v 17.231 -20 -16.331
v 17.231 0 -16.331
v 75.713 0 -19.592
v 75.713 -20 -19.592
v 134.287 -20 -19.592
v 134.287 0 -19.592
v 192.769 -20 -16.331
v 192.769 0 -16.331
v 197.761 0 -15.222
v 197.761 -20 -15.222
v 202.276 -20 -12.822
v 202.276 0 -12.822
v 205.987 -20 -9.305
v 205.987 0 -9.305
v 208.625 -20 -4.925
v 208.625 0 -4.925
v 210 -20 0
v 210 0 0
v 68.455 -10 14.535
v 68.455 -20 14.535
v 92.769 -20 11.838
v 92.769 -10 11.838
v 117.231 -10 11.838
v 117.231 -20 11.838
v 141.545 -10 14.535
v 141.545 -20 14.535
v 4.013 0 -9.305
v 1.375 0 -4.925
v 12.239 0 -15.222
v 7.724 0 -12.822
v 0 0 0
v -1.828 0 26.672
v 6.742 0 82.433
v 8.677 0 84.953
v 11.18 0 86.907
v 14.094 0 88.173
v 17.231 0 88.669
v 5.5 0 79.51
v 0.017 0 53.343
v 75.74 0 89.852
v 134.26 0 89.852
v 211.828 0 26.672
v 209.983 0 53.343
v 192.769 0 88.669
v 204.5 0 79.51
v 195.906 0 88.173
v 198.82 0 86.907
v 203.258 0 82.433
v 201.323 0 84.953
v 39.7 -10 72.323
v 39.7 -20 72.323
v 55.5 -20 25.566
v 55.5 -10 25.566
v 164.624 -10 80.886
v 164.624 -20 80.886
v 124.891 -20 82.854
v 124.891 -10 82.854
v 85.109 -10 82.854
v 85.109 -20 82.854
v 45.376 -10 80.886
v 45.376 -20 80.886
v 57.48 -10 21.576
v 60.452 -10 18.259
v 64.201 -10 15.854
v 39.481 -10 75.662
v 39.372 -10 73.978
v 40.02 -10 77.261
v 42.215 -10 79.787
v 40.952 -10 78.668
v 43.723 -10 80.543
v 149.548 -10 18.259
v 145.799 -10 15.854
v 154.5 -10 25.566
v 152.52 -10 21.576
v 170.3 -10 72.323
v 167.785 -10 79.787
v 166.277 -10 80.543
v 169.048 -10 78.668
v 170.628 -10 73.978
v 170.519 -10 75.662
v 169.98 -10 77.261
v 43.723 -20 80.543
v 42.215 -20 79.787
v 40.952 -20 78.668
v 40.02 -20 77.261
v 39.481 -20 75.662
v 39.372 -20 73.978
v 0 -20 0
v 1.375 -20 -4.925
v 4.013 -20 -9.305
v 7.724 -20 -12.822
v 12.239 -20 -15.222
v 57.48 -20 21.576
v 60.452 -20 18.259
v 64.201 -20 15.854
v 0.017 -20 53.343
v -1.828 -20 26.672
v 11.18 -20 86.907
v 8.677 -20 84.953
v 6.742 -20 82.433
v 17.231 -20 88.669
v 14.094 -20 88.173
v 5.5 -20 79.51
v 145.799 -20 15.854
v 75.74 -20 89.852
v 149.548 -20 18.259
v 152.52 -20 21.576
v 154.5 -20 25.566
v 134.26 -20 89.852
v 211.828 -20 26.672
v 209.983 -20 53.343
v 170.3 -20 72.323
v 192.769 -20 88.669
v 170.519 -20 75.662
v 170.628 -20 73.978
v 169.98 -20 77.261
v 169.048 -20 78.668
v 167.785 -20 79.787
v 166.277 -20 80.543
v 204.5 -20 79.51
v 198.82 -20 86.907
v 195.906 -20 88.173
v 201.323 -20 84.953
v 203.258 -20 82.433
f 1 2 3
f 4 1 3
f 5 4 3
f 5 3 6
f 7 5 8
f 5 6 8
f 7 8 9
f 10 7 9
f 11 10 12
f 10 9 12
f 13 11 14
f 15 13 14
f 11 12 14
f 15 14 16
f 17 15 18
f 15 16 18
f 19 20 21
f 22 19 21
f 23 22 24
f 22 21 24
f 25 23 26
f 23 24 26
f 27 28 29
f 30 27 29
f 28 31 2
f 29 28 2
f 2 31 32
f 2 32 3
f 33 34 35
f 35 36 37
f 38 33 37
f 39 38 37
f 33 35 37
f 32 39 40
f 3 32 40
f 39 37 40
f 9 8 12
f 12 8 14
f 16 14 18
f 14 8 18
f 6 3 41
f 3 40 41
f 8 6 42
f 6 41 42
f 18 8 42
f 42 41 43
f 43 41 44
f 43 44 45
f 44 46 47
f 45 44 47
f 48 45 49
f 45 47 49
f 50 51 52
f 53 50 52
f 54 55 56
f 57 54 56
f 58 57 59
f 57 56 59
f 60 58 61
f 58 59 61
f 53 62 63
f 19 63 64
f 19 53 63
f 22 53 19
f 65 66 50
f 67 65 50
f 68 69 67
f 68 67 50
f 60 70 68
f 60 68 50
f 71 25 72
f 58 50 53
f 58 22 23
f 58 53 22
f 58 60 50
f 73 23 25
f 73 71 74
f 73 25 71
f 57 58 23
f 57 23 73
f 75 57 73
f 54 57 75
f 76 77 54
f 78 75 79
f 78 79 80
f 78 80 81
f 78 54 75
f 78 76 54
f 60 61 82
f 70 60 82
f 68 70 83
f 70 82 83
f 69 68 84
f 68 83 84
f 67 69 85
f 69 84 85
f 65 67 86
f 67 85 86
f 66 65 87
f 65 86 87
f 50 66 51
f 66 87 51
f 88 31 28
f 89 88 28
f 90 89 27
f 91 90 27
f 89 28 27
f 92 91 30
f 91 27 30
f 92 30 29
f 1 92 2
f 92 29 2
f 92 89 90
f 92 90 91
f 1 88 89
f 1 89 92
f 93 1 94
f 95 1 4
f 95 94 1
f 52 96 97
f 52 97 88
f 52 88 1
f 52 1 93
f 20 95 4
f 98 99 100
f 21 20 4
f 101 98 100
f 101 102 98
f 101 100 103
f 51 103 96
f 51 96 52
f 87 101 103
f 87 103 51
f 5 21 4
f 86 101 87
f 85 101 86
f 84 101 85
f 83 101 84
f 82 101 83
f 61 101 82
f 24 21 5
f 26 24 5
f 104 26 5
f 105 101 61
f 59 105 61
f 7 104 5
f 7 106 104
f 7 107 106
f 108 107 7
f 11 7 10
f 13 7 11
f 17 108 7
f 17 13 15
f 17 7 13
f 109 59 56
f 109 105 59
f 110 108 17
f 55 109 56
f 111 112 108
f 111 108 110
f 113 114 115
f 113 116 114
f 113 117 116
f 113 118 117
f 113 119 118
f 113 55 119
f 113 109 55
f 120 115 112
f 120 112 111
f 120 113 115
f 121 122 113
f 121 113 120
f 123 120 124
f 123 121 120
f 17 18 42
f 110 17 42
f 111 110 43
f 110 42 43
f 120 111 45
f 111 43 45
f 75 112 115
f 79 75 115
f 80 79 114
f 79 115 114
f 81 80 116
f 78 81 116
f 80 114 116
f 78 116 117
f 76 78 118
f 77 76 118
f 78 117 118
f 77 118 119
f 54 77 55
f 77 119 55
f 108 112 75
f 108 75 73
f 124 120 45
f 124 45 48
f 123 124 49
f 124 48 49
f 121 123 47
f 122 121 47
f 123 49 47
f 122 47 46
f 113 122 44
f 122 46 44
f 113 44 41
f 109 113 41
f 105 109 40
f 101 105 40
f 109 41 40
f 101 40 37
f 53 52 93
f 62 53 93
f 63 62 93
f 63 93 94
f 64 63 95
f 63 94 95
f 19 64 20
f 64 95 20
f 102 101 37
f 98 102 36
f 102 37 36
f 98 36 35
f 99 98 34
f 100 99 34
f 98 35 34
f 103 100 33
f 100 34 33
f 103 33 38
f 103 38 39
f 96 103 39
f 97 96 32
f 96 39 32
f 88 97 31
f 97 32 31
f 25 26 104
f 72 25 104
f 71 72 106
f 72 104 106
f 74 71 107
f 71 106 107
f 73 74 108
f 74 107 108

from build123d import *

# Parameters (mm, degrees)
PAD_DEPTH    = 20
POCKET_DEPTH = 10


with BuildPart() as part:
    # Sketch → Pad (new body)
    with BuildSketch(Plane.XZ):
        with BuildLine():
            ThreePointArc((0, 0), (5.749809, -11.188952), (17.230824, -16.330866))
            ThreePointArc((17.230824, -16.330866), (105, -20), (192.769176, -16.330866))
            ThreePointArc((192.769176, -16.330866), (204.250191, -11.188952), (210, 0))
            ThreePointArc((210, 0), (211.364147, 40.039591), (204.5, 79.51))
            ThreePointArc((204.5, 79.51), (200.133385, 86.009194), (192.769176, 88.669134))
            ThreePointArc((192.769176, 88.669134), (105, 90), (17.230824, 88.669134))
            ThreePointArc((17.230824, 88.669134), (9.866615, 86.009194), (5.5, 79.51))
            ThreePointArc((5.5, 79.51), (-1.364147, 40.039591), (0, 0))
        make_face()
    extrude(amount=PAD_DEPTH)

    # Sketch001 (on Face10 of Pad) → Pocket (cut)
    with BuildSketch(Plane.XZ.offset(20)):
        with BuildLine():
            ThreePointArc((164.624157, 80.885897), (105, 83.1), (45.375843, 80.885897))
            ThreePointArc((45.375843, 80.885897), (40.44004, 77.994973), (39.7, 72.322942))
            Line((39.7, 72.322942), (55.5, 25.565661))
            ThreePointArc((55.5, 25.565661), (60.452364, 18.259103), (68.455126, 14.535192))
            ThreePointArc((68.455126, 14.535192), (105, 11.5), (141.544874, 14.535192))
            ThreePointArc((141.544874, 14.535192), (149.547636, 18.259103), (154.5, 25.565661))
            Line((170.3, 72.322942), (154.5, 25.565661))
            ThreePointArc((170.3, 72.322942), (169.55996, 77.994973), (164.624157, 80.885897))
        make_face()
    extrude(amount=-POCKET_DEPTH, mode=Mode.SUBTRACT)


solid = part.part
